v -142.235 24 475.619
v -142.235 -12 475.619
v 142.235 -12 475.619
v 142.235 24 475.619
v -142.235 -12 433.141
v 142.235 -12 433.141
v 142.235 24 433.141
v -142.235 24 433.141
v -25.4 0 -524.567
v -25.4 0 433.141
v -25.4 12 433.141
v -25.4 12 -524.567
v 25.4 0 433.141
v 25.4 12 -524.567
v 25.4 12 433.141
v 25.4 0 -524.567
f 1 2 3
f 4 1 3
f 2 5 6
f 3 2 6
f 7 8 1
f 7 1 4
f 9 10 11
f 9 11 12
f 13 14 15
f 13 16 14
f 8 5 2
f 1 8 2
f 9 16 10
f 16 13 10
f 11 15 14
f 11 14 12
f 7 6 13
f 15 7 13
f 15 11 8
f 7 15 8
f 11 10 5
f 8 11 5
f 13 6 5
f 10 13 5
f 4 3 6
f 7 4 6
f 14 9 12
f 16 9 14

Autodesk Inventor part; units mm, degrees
ref_plane "YZ Plane" through (0, 0, 0) normal (1, 0, 0) x (0, 1, 0)
ref_plane "XZ Plane" through (0, 0, 0) normal (0, 1, 0) x (-1, 0, 0)
ref_plane "XY Plane" through (0, 0, 0) normal (0, 0, 1) x (1, 0, 0)
sketch "Sketch1" plane through (0, 0, 0) normal (0, 1, 0) x (-1, 0, 0)
  line L0 (25.4, -475) -> (-25.4, -475)
  line L1 (-25.4, -475) -> (-25.4, 475)
  line L2 (-25.4, 475) -> (25.4, 475)
  line L3 (25.4, 475) -> (25.4, -475)
  line L4 (25.4, -475) -> (-25.4, 475) construction
  line L5 (-25.4, -475) -> (25.4, 475) construction
  point P0 (0, 0)
  dimension "d0" = 50.8
  dimension "d1" = 950
extrude "Extrusion1" add sketch "Sketch1" along normal blind 12
sketch "Sketch2" plane through (0, 12, 0) normal (0, 1, 0) x (1, 0, 0)
  line L0 (142.2351, -433.1412) -> (-142.2351, -433.1412)
  line L1 (-142.2351, -433.1412) -> (-142.2351, -475.6186)
  line L2 (-142.2351, -475.6186) -> (142.2351, -475.6186)
  line L3 (142.2351, -475.6186) -> (142.2351, -433.1412)
  line L4 (142.2351, -433.1412) -> (-142.2351, -475.6186) construction
  line L5 (-142.2351, -433.1412) -> (142.2351, -475.6186) construction
  point P0 (0, 0)
  point P1 (0, -454.3799)
extrude "Extrusion2" add sketch "Sketch2" along normal blind 12 and the other way blind 24
sketch "Sketch3" plane through (0, 12, 0) normal (0, 1, 0) x (1, 0, 0)
  line L0 (-638.112, 621.7865) -> (344.254, 621.7865)
  line L1 (344.254, 621.7865) -> (344.254, 342.1246)
  line L2 (344.254, 342.1246) -> (-638.112, 342.1246)
  line L3 (-638.112, 342.1246) -> (-638.112, 621.7865)
  line L4 (-638.112, 621.7865) -> (344.254, 342.1246) construction
  line L5 (344.254, 621.7865) -> (-638.112, 342.1246) construction
  point P0 (0, 0)
  point P1 (-146.929, 481.9555)
extrude "Extrusion3" cut sketch "Sketch3" against normal blind 304.8 and the other way blind 152.4
sketch "Sketch4" plane through (0, 12, 0) normal (0, 1, 0) x (1, 0, 0)
  line L0 (-80.2076, 578.4886) -> (80.2076, 578.4886)
  line L1 (80.2076, 578.4886) -> (80.2076, 185.2583)
  line L2 (80.2076, 185.2583) -> (-80.2076, 185.2583)
  line L3 (-80.2076, 185.2583) -> (-80.2076, 578.4886)
  line L4 (-80.2076, 578.4886) -> (80.2076, 185.2583) construction
  line L5 (80.2076, 578.4886) -> (-80.2076, 185.2583) construction
  point P0 (0, 0)
  point P1 (0, 381.8735)
extrude "Extrusion4" cut sketch "Sketch4" against normal blind 304.8
sketch "Sketch5" plane through (0, 0, 0) normal (0, 1, 0) x (-1, 0, 0)
  line L0 (-25.4, 475.4333) -> (25.4, 475.4333)
  line L1 (25.4, 475.4333) -> (25.4, -524.5667)
  line L2 (25.4, -524.5667) -> (-25.4, -524.5667)
  line L3 (-25.4, -524.5667) -> (-25.4, 475.4333)
  point P0 (0, 0)
  dimension "d14" = 50.8
  dimension "d15" = 1000
extrude "Extrusion5" add sketch "Sketch5" along normal blind 12
sketch "Sketch6" plane through (0, 0, 0) normal (0, 1, 0) x (-1, 0, 0)
  point P0 (0, 0)
properties part number "hopper stand"
